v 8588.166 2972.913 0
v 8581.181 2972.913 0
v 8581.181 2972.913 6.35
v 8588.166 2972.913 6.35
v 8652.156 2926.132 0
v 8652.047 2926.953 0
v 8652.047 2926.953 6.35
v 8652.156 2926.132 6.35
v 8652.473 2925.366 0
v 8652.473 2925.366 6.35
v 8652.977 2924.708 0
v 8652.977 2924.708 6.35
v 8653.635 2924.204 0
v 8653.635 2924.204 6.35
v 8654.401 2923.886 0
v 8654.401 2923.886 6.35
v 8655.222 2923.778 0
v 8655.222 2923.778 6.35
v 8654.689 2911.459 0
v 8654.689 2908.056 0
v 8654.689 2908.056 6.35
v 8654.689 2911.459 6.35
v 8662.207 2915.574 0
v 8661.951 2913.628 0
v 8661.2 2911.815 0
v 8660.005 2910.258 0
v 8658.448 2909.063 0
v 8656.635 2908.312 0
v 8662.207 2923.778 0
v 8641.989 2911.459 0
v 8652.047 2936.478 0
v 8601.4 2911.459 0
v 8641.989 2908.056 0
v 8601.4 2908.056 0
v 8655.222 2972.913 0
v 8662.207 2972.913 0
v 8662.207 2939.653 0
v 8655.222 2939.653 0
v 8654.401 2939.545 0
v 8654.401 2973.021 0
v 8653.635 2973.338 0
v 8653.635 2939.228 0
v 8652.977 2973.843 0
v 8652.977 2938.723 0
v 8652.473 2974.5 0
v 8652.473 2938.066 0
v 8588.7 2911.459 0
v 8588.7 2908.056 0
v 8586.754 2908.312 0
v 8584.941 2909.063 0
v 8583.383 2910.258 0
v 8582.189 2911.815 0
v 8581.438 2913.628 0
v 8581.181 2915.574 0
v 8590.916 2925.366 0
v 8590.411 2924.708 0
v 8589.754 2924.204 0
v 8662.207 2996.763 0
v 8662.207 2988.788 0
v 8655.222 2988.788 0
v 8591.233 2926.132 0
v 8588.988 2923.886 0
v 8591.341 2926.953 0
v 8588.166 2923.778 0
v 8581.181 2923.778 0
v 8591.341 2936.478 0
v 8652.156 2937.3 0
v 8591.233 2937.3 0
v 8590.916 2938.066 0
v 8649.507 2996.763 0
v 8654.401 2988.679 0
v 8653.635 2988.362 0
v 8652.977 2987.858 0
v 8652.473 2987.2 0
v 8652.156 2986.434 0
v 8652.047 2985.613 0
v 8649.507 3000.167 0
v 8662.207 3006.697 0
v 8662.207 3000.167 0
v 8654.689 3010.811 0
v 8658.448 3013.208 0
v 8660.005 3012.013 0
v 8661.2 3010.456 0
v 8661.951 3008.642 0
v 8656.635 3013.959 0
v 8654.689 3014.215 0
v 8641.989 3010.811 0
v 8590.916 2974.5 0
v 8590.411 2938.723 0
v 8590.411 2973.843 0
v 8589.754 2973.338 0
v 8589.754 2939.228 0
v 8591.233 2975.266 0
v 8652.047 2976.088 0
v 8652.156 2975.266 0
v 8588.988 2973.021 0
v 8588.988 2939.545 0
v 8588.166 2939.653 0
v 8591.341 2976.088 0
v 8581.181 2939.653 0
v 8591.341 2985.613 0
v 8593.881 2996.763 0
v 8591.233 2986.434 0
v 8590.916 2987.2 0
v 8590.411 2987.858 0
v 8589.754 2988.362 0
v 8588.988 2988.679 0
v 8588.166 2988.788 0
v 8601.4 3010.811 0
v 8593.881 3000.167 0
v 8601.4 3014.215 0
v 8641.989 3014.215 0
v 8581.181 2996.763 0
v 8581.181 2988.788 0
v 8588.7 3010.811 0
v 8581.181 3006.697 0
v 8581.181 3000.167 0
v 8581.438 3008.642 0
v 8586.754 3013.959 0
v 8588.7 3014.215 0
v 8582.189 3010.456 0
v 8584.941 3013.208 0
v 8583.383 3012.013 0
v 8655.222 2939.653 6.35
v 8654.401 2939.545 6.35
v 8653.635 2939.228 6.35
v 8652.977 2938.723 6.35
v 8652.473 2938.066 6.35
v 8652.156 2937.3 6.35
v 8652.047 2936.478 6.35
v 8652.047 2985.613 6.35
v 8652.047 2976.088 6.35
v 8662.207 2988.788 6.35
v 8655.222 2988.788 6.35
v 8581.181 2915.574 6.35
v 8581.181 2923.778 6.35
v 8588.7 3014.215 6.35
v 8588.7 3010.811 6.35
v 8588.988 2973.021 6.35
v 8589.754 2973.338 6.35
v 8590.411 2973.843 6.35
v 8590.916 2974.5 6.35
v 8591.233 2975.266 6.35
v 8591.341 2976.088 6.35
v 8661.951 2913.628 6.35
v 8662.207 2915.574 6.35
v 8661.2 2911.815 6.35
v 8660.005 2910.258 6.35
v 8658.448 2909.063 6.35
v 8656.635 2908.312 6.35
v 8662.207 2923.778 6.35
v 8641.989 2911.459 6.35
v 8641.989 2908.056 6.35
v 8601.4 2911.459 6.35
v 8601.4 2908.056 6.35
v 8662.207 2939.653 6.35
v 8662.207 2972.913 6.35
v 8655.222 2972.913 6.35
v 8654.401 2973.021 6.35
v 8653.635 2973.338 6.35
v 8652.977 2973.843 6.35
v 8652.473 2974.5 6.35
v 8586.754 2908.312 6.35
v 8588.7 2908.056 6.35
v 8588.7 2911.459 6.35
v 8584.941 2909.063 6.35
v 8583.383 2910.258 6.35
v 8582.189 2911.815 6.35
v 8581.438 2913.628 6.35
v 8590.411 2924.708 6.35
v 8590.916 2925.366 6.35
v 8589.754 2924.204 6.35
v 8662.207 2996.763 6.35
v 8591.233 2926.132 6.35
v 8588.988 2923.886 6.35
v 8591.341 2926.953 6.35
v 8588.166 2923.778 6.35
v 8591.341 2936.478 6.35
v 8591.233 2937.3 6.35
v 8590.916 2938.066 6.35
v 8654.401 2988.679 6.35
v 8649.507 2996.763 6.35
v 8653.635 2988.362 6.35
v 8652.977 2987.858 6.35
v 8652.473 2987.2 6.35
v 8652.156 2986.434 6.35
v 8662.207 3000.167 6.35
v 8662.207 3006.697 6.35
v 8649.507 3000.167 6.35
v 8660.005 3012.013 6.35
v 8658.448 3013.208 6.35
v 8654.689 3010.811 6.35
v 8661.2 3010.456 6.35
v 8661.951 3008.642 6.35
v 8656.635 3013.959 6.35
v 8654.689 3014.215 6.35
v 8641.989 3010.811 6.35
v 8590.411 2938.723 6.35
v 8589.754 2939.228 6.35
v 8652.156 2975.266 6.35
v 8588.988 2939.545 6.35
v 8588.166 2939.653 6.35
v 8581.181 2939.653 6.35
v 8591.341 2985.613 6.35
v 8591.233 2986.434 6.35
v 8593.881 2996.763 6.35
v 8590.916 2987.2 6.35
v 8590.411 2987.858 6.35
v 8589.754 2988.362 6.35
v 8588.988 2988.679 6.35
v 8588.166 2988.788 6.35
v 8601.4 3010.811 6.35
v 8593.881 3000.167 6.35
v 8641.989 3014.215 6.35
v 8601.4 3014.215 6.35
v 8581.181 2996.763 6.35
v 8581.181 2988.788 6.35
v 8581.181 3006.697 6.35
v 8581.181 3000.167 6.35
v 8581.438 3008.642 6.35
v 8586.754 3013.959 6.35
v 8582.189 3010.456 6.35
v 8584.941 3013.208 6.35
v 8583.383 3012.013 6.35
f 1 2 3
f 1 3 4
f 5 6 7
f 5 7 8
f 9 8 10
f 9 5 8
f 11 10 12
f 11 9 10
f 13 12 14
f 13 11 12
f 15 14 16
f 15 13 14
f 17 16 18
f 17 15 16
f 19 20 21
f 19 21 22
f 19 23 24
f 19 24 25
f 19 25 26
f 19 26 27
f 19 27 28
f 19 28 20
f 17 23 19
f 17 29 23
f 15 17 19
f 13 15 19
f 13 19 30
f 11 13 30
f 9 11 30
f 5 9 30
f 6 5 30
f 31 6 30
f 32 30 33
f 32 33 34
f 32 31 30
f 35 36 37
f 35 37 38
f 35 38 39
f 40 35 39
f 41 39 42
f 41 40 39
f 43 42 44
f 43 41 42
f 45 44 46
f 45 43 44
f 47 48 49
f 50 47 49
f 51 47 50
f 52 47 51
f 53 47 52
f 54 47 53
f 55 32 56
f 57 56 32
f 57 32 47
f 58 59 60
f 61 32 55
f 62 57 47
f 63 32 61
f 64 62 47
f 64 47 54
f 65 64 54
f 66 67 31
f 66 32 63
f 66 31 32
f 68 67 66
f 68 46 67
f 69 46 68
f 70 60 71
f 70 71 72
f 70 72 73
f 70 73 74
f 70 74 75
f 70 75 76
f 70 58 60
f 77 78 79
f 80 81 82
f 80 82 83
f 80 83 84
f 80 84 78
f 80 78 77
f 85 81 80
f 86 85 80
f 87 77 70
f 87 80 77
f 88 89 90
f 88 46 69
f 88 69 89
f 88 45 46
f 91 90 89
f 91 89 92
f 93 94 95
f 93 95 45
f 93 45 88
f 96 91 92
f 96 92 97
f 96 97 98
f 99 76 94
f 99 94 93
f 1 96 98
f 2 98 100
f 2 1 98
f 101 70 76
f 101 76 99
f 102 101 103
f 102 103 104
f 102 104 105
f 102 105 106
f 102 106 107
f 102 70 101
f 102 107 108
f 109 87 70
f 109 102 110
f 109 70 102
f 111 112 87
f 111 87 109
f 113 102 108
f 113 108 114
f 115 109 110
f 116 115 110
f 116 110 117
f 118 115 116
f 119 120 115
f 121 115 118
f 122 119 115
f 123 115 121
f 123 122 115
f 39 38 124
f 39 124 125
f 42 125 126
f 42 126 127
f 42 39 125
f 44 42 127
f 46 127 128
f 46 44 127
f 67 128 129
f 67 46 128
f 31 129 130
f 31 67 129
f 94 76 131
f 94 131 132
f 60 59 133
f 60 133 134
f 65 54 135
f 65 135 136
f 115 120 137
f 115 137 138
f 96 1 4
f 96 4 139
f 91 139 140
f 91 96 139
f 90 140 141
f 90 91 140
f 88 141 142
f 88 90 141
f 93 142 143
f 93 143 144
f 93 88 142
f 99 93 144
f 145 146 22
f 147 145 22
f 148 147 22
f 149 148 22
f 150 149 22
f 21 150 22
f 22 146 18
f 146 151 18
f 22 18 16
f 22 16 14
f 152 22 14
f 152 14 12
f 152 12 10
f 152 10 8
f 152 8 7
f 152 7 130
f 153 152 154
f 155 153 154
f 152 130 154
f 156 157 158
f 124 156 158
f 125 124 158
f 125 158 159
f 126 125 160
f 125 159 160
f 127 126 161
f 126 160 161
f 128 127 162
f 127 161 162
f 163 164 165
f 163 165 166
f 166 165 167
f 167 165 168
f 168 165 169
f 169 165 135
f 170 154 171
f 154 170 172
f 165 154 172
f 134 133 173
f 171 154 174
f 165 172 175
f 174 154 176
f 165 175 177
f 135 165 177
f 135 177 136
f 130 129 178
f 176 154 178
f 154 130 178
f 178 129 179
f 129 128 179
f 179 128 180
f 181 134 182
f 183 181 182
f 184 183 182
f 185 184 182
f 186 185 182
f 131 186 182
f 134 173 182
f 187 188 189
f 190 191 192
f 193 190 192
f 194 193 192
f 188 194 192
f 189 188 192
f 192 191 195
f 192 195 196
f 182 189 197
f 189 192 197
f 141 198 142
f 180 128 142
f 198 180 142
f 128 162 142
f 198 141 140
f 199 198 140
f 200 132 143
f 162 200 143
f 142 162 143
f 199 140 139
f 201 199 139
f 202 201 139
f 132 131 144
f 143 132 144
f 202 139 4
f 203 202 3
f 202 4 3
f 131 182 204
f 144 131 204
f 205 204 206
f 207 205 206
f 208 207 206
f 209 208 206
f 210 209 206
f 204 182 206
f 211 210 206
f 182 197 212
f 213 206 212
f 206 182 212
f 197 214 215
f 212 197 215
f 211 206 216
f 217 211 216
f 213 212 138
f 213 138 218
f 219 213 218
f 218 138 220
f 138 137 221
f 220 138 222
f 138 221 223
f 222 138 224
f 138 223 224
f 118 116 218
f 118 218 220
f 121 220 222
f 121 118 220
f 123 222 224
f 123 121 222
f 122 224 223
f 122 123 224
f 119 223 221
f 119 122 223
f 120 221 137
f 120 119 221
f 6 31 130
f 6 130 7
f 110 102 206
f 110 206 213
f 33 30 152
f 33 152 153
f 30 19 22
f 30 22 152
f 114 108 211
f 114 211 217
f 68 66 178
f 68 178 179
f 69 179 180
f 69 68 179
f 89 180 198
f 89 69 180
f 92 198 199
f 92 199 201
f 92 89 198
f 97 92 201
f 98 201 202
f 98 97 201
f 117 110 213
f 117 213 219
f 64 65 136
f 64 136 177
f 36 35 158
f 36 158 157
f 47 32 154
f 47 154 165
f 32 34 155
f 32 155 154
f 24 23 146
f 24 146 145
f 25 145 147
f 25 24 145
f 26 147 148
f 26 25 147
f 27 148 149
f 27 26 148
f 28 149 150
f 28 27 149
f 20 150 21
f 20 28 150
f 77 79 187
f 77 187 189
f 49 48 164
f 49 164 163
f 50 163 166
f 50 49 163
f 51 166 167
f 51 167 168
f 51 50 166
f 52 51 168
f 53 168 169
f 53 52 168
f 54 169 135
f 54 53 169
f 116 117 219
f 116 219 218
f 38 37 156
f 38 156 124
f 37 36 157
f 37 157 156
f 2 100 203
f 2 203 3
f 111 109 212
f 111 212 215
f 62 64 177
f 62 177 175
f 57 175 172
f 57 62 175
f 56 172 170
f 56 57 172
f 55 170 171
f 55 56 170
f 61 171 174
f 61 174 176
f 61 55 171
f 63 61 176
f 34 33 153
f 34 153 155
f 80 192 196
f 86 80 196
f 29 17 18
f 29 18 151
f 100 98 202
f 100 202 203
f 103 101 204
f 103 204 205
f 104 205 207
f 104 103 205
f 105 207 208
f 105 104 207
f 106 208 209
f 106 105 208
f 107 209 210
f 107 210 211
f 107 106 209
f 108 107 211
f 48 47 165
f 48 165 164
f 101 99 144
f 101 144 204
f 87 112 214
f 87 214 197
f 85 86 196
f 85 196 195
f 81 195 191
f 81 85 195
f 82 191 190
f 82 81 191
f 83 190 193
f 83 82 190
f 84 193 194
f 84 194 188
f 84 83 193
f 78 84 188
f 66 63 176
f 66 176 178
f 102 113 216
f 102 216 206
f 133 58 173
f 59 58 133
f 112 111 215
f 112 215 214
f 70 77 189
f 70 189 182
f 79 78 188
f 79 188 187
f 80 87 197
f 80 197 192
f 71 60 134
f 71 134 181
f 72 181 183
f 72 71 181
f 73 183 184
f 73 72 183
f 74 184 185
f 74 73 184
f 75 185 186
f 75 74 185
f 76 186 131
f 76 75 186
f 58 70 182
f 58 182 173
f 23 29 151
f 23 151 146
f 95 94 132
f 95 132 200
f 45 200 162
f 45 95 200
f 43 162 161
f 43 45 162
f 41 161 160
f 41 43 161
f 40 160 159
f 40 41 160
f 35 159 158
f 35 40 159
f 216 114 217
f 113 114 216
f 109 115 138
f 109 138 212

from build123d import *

# Parameters (mm, degrees)
BOSS_EXTRUDE1_DEPTH = 6.35


with BuildPart() as part:
    # Sketch1 → Boss-Extrude1 (new body)
    with BuildSketch(Plane.XY):
        with BuildLine():
            Line((8662.207393671, 3006.696553149), (8662.207393671, 3000.166824887))
            Line((8662.207393671, 3000.166824887), (8649.507393671, 3000.166824887))
            Line((8649.507393671, 3000.166824887), (8649.507393671, 2996.763224887))
            Line((8649.507393671, 2996.763224887), (8662.207393671, 2996.763224887))
            Line((8662.207393671, 2996.763224887), (8662.207393671, 2988.787624887))
            Line((8662.207393671, 2988.787624887), (8655.222393671, 2988.787624887))
            ThreePointArc((8655.222393671, 2988.787624887), (8652.977329641, 2987.857688918), (8652.047393671, 2985.612624887))
            Line((8652.047393671, 2985.612624887), (8652.047393671, 2976.087624887))
            ThreePointArc((8652.047393671, 2976.087624887), (8652.977329641, 2973.842560857), (8655.222393671, 2972.912624887))
            Line((8655.222393671, 2972.912624887), (8662.207393671, 2972.912624887))
            Line((8662.207393671, 2972.912624887), (8662.207393671, 2939.653253149))
            Line((8662.207393671, 2939.653253149), (8655.222393671, 2939.653253149))
            ThreePointArc((8655.222393671, 2939.653253149), (8652.977329641, 2938.723317179), (8652.047393671, 2936.478253149))
            Line((8652.047393671, 2936.478253149), (8652.047393671, 2926.953253149))
            ThreePointArc((8652.047393671, 2926.953253149), (8652.977329641, 2924.708189118), (8655.222393671, 2923.778253149))
            Line((8655.222393671, 2923.778253149), (8662.207393671, 2923.778253149))
            Line((8662.207393671, 2923.778253149), (8662.207393671, 2915.574053149))
            ThreePointArc((8662.207393671, 2915.574053149), (8660.005305295, 2910.257741525), (8654.688993671, 2908.055653149))
            Line((8654.688993671, 2908.055653149), (8654.688993671, 2911.459253149))
            Line((8654.688993671, 2911.459253149), (8641.988993671, 2911.459253149))
            Line((8641.988993671, 2911.459253149), (8641.988993671, 2908.055653149))
            Line((8641.988993671, 2908.055653149), (8601.399793671, 2908.055653149))
            Line((8601.399793671, 2908.055653149), (8601.399793671, 2911.459253149))
            Line((8601.399793671, 2911.459253149), (8588.699793671, 2911.459253149))
            Line((8588.699793671, 2911.459253149), (8588.699793671, 2908.055653149))
            ThreePointArc((8588.699793671, 2908.055653149), (8583.383482047, 2910.257741525), (8581.181393671, 2915.574053149))
            Line((8581.181393671, 2915.574053149), (8581.181393671, 2923.778253149))
            Line((8581.181393671, 2923.778253149), (8588.166393671, 2923.778253149))
            ThreePointArc((8588.166393671, 2923.778253149), (8590.411457701, 2924.708189118), (8591.341393671, 2926.953253149))
            Line((8591.341393671, 2926.953253149), (8591.341393671, 2936.478253149))
            ThreePointArc((8591.341393671, 2936.478253149), (8590.411457701, 2938.723317179), (8588.166393671, 2939.653253149))
            Line((8588.166393671, 2939.653253149), (8581.181393671, 2939.653253149))
            Line((8581.181393671, 2939.653253149), (8581.181393671, 2972.912624887))
            Line((8581.181393671, 2972.912624887), (8588.166393671, 2972.912624887))
            ThreePointArc((8588.166393671, 2972.912624887), (8590.411457701, 2973.842560857), (8591.341393671, 2976.087624887))
            Line((8591.341393671, 2976.087624887), (8591.341393671, 2985.612624887))
            ThreePointArc((8591.341393671, 2985.612624887), (8590.411457701, 2987.857688918), (8588.166393671, 2988.787624887))
            Line((8588.166393671, 2988.787624887), (8581.181393671, 2988.787624887))
            Line((8581.181393671, 2988.787624887), (8581.181393671, 2996.763224887))
            Line((8581.181393671, 2996.763224887), (8593.881393671, 2996.763224887))
            Line((8593.881393671, 2996.763224887), (8593.881393671, 3000.166824887))
            Line((8593.881393671, 3000.166824887), (8581.181393671, 3000.166824887))
            Line((8581.181393671, 3000.166824887), (8581.181393671, 3006.696553149))
            ThreePointArc((8581.181393671, 3006.696553149), (8583.383482047, 3012.012864772), (8588.699793671, 3014.214953149))
            Line((8588.699793671, 3014.214953149), (8588.699793671, 3010.811353149))
            Line((8588.699793671, 3010.811353149), (8601.399793671, 3010.811353149))
            Line((8601.399793671, 3010.811353149), (8601.399793671, 3014.214953149))
            Line((8601.399793671, 3014.214953149), (8641.988993671, 3014.214953149))
            Line((8641.988993671, 3014.214953149), (8641.988993671, 3010.811353149))
            Line((8641.988993671, 3010.811353149), (8654.688993671, 3010.811353149))
            Line((8654.688993671, 3010.811353149), (8654.688993671, 3014.214953149))
            ThreePointArc((8654.688993671, 3014.214953149), (8660.005305295, 3012.012864772), (8662.207393671, 3006.696553149))
        make_face()
    extrude(amount=BOSS_EXTRUDE1_DEPTH)


solid = part.part
